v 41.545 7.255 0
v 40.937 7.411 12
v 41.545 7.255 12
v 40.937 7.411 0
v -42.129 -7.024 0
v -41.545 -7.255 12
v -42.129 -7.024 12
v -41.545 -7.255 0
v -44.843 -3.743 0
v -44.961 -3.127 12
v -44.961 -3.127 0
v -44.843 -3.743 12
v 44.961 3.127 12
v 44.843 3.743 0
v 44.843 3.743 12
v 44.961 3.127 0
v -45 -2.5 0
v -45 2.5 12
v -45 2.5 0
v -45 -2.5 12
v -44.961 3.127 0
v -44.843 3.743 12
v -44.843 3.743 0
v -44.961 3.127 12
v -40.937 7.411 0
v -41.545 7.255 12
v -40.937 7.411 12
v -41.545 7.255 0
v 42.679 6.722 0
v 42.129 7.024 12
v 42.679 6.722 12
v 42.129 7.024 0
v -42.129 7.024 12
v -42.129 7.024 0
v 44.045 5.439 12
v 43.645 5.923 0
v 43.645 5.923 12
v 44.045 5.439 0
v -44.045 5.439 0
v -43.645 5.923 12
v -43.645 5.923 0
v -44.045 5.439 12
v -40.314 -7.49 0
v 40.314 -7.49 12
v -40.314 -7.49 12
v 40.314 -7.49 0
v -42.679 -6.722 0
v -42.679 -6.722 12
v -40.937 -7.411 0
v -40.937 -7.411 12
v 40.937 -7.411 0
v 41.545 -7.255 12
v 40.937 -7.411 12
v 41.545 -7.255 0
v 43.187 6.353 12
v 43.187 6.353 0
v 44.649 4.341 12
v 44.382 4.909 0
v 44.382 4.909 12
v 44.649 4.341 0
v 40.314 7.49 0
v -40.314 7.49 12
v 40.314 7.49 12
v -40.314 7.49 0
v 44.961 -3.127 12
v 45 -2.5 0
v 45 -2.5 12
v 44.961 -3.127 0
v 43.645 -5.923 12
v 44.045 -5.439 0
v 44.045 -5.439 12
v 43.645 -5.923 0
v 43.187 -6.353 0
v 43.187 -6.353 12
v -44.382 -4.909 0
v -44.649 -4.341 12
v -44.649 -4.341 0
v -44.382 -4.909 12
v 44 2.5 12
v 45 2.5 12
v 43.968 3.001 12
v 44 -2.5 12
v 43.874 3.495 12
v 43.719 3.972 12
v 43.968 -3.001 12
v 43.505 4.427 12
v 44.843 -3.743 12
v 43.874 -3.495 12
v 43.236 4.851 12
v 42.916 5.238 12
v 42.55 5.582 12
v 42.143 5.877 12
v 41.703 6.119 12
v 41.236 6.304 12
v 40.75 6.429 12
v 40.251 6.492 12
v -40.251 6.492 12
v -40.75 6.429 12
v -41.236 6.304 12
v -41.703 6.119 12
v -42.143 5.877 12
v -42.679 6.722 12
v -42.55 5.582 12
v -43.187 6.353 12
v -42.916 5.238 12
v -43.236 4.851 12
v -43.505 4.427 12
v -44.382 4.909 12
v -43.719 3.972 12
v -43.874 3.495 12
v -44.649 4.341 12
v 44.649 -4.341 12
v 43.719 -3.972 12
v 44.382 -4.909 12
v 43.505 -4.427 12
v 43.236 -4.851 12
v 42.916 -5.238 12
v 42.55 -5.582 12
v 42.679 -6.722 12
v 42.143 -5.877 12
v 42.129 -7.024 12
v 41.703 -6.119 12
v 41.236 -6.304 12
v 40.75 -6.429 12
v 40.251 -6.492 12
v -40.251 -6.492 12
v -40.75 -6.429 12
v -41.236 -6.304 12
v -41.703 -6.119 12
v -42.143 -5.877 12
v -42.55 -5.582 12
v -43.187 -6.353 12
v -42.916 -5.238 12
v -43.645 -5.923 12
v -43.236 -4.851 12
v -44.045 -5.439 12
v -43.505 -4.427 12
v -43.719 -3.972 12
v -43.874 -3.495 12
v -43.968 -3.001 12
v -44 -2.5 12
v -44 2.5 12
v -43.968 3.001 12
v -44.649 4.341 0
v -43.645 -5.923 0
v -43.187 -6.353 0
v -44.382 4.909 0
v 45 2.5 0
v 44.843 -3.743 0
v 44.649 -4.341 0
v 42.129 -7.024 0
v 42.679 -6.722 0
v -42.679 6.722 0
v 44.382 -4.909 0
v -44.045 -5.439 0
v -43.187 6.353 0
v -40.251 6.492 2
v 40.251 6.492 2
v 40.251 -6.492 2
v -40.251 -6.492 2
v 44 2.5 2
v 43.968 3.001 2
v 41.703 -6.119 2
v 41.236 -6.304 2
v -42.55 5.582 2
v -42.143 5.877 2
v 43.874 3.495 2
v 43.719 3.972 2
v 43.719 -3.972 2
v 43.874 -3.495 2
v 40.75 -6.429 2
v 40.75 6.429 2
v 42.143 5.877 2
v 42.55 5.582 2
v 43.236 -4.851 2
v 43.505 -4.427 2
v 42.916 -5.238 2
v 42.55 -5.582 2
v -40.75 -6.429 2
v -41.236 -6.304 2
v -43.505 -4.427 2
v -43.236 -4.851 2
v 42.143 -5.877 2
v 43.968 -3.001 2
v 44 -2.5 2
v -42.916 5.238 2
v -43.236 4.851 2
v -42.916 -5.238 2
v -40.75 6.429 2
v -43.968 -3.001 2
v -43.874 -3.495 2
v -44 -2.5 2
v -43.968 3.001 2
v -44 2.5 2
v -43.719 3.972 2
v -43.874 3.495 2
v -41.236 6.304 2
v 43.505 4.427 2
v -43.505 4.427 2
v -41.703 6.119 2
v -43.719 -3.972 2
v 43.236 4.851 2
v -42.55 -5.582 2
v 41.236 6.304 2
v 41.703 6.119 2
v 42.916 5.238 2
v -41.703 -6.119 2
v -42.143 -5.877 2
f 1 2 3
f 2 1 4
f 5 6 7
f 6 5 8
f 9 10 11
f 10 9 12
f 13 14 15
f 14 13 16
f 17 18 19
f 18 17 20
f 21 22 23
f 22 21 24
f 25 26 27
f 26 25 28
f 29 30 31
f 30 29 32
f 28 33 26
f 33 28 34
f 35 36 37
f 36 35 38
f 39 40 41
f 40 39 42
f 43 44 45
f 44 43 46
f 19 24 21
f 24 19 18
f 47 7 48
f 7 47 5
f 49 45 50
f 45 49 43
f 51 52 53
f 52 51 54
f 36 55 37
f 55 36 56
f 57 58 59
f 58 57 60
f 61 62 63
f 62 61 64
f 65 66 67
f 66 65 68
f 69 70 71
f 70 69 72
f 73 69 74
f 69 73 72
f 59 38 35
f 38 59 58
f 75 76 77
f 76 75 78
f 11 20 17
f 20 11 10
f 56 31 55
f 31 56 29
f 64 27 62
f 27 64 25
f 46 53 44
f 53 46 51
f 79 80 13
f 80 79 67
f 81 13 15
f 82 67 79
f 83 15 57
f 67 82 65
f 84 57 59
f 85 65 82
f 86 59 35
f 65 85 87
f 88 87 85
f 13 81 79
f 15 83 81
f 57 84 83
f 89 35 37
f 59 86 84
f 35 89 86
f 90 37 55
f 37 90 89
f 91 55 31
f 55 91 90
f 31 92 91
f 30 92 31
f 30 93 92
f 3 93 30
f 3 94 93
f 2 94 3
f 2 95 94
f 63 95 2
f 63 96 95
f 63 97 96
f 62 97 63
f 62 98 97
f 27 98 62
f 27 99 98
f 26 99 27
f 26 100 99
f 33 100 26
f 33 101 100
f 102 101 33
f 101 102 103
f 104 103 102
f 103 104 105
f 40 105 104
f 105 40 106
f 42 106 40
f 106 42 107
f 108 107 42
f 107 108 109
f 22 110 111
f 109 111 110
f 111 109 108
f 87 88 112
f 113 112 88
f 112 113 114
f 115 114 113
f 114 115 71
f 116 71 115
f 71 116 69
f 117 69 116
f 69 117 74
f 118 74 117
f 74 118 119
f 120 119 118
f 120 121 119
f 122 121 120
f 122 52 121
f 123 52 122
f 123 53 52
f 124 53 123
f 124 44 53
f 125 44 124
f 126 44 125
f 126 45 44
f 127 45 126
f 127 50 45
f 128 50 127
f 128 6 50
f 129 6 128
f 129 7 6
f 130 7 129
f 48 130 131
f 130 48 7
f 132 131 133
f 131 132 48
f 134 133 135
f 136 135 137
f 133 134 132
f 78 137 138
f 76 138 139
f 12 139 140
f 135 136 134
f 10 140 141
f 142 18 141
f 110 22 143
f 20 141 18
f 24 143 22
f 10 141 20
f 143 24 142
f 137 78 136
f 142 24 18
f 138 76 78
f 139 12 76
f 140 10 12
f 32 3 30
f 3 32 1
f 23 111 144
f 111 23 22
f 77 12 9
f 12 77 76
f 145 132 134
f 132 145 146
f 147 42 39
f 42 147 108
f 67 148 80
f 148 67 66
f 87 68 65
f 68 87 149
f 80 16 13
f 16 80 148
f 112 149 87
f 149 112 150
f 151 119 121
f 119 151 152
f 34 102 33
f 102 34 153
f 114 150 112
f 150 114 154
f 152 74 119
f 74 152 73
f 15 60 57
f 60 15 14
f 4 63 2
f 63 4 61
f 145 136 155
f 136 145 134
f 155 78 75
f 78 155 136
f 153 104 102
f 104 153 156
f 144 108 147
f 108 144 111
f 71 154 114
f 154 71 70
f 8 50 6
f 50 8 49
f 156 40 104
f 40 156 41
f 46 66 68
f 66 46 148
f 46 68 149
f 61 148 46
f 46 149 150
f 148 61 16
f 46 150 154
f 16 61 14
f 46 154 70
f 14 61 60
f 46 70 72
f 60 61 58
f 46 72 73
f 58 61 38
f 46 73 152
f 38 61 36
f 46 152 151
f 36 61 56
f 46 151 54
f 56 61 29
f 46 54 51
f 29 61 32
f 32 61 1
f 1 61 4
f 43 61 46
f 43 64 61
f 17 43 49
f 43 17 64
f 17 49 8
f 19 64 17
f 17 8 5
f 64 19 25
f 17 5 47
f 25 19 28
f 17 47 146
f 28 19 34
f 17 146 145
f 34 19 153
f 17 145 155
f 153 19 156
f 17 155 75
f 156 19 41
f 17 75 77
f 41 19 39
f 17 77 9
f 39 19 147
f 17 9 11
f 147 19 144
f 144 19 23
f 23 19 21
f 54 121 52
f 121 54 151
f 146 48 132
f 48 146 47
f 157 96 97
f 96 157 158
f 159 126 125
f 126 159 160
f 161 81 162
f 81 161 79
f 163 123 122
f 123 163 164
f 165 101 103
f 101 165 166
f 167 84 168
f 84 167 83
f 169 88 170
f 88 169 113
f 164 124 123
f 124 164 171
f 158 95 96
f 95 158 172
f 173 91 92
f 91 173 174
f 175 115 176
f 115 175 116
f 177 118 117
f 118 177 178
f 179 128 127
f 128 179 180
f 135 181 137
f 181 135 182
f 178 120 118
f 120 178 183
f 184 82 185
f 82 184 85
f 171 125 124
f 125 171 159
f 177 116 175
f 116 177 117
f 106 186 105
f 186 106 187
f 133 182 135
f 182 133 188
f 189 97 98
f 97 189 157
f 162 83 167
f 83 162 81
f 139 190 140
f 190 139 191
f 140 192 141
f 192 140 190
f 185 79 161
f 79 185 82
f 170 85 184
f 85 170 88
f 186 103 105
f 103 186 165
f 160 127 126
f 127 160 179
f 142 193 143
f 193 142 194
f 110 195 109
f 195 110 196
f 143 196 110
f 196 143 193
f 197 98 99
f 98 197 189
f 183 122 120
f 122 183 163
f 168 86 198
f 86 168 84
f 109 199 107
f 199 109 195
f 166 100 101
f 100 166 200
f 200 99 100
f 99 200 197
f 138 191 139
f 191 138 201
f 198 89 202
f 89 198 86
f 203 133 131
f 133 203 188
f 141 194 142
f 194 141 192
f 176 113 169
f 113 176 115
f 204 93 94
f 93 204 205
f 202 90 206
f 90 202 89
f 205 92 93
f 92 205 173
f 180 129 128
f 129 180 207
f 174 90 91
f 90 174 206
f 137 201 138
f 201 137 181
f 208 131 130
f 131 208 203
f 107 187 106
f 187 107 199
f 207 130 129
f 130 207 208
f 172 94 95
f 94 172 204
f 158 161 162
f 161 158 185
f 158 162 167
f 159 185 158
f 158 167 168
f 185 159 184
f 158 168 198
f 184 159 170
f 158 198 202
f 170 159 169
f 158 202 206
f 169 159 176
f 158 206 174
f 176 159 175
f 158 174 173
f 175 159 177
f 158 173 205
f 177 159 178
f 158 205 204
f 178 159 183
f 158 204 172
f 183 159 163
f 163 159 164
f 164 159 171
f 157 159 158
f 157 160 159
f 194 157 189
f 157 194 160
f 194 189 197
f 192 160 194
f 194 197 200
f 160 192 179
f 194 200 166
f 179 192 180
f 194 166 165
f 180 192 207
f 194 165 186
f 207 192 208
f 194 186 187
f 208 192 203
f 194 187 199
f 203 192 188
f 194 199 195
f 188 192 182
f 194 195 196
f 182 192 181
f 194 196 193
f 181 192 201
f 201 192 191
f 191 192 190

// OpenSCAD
$fn = 50;


difference() {
	union() {
		hull() {
			translate(v = [-40.0000000000, 2.5000000000, 0]) {
				cylinder(h = 12, r = 5);
			}
			translate(v = [40.0000000000, 2.5000000000, 0]) {
				cylinder(h = 12, r = 5);
			}
			translate(v = [-40.0000000000, -2.5000000000, 0]) {
				cylinder(h = 12, r = 5);
			}
			translate(v = [40.0000000000, -2.5000000000, 0]) {
				cylinder(h = 12, r = 5);
			}
		}
	}
	union() {
		translate(v = [0, 0, 2]) {
			#hull() {
				translate(v = [-40.0000000000, 2.5000000000, 0]) {
					cylinder(h = 10, r = 4);
				}
				translate(v = [40.0000000000, 2.5000000000, 0]) {
					cylinder(h = 10, r = 4);
				}
				translate(v = [-40.0000000000, -2.5000000000, 0]) {
					cylinder(h = 10, r = 4);
				}
				translate(v = [40.0000000000, -2.5000000000, 0]) {
					cylinder(h = 10, r = 4);
				}
			}
		}
	}
}
